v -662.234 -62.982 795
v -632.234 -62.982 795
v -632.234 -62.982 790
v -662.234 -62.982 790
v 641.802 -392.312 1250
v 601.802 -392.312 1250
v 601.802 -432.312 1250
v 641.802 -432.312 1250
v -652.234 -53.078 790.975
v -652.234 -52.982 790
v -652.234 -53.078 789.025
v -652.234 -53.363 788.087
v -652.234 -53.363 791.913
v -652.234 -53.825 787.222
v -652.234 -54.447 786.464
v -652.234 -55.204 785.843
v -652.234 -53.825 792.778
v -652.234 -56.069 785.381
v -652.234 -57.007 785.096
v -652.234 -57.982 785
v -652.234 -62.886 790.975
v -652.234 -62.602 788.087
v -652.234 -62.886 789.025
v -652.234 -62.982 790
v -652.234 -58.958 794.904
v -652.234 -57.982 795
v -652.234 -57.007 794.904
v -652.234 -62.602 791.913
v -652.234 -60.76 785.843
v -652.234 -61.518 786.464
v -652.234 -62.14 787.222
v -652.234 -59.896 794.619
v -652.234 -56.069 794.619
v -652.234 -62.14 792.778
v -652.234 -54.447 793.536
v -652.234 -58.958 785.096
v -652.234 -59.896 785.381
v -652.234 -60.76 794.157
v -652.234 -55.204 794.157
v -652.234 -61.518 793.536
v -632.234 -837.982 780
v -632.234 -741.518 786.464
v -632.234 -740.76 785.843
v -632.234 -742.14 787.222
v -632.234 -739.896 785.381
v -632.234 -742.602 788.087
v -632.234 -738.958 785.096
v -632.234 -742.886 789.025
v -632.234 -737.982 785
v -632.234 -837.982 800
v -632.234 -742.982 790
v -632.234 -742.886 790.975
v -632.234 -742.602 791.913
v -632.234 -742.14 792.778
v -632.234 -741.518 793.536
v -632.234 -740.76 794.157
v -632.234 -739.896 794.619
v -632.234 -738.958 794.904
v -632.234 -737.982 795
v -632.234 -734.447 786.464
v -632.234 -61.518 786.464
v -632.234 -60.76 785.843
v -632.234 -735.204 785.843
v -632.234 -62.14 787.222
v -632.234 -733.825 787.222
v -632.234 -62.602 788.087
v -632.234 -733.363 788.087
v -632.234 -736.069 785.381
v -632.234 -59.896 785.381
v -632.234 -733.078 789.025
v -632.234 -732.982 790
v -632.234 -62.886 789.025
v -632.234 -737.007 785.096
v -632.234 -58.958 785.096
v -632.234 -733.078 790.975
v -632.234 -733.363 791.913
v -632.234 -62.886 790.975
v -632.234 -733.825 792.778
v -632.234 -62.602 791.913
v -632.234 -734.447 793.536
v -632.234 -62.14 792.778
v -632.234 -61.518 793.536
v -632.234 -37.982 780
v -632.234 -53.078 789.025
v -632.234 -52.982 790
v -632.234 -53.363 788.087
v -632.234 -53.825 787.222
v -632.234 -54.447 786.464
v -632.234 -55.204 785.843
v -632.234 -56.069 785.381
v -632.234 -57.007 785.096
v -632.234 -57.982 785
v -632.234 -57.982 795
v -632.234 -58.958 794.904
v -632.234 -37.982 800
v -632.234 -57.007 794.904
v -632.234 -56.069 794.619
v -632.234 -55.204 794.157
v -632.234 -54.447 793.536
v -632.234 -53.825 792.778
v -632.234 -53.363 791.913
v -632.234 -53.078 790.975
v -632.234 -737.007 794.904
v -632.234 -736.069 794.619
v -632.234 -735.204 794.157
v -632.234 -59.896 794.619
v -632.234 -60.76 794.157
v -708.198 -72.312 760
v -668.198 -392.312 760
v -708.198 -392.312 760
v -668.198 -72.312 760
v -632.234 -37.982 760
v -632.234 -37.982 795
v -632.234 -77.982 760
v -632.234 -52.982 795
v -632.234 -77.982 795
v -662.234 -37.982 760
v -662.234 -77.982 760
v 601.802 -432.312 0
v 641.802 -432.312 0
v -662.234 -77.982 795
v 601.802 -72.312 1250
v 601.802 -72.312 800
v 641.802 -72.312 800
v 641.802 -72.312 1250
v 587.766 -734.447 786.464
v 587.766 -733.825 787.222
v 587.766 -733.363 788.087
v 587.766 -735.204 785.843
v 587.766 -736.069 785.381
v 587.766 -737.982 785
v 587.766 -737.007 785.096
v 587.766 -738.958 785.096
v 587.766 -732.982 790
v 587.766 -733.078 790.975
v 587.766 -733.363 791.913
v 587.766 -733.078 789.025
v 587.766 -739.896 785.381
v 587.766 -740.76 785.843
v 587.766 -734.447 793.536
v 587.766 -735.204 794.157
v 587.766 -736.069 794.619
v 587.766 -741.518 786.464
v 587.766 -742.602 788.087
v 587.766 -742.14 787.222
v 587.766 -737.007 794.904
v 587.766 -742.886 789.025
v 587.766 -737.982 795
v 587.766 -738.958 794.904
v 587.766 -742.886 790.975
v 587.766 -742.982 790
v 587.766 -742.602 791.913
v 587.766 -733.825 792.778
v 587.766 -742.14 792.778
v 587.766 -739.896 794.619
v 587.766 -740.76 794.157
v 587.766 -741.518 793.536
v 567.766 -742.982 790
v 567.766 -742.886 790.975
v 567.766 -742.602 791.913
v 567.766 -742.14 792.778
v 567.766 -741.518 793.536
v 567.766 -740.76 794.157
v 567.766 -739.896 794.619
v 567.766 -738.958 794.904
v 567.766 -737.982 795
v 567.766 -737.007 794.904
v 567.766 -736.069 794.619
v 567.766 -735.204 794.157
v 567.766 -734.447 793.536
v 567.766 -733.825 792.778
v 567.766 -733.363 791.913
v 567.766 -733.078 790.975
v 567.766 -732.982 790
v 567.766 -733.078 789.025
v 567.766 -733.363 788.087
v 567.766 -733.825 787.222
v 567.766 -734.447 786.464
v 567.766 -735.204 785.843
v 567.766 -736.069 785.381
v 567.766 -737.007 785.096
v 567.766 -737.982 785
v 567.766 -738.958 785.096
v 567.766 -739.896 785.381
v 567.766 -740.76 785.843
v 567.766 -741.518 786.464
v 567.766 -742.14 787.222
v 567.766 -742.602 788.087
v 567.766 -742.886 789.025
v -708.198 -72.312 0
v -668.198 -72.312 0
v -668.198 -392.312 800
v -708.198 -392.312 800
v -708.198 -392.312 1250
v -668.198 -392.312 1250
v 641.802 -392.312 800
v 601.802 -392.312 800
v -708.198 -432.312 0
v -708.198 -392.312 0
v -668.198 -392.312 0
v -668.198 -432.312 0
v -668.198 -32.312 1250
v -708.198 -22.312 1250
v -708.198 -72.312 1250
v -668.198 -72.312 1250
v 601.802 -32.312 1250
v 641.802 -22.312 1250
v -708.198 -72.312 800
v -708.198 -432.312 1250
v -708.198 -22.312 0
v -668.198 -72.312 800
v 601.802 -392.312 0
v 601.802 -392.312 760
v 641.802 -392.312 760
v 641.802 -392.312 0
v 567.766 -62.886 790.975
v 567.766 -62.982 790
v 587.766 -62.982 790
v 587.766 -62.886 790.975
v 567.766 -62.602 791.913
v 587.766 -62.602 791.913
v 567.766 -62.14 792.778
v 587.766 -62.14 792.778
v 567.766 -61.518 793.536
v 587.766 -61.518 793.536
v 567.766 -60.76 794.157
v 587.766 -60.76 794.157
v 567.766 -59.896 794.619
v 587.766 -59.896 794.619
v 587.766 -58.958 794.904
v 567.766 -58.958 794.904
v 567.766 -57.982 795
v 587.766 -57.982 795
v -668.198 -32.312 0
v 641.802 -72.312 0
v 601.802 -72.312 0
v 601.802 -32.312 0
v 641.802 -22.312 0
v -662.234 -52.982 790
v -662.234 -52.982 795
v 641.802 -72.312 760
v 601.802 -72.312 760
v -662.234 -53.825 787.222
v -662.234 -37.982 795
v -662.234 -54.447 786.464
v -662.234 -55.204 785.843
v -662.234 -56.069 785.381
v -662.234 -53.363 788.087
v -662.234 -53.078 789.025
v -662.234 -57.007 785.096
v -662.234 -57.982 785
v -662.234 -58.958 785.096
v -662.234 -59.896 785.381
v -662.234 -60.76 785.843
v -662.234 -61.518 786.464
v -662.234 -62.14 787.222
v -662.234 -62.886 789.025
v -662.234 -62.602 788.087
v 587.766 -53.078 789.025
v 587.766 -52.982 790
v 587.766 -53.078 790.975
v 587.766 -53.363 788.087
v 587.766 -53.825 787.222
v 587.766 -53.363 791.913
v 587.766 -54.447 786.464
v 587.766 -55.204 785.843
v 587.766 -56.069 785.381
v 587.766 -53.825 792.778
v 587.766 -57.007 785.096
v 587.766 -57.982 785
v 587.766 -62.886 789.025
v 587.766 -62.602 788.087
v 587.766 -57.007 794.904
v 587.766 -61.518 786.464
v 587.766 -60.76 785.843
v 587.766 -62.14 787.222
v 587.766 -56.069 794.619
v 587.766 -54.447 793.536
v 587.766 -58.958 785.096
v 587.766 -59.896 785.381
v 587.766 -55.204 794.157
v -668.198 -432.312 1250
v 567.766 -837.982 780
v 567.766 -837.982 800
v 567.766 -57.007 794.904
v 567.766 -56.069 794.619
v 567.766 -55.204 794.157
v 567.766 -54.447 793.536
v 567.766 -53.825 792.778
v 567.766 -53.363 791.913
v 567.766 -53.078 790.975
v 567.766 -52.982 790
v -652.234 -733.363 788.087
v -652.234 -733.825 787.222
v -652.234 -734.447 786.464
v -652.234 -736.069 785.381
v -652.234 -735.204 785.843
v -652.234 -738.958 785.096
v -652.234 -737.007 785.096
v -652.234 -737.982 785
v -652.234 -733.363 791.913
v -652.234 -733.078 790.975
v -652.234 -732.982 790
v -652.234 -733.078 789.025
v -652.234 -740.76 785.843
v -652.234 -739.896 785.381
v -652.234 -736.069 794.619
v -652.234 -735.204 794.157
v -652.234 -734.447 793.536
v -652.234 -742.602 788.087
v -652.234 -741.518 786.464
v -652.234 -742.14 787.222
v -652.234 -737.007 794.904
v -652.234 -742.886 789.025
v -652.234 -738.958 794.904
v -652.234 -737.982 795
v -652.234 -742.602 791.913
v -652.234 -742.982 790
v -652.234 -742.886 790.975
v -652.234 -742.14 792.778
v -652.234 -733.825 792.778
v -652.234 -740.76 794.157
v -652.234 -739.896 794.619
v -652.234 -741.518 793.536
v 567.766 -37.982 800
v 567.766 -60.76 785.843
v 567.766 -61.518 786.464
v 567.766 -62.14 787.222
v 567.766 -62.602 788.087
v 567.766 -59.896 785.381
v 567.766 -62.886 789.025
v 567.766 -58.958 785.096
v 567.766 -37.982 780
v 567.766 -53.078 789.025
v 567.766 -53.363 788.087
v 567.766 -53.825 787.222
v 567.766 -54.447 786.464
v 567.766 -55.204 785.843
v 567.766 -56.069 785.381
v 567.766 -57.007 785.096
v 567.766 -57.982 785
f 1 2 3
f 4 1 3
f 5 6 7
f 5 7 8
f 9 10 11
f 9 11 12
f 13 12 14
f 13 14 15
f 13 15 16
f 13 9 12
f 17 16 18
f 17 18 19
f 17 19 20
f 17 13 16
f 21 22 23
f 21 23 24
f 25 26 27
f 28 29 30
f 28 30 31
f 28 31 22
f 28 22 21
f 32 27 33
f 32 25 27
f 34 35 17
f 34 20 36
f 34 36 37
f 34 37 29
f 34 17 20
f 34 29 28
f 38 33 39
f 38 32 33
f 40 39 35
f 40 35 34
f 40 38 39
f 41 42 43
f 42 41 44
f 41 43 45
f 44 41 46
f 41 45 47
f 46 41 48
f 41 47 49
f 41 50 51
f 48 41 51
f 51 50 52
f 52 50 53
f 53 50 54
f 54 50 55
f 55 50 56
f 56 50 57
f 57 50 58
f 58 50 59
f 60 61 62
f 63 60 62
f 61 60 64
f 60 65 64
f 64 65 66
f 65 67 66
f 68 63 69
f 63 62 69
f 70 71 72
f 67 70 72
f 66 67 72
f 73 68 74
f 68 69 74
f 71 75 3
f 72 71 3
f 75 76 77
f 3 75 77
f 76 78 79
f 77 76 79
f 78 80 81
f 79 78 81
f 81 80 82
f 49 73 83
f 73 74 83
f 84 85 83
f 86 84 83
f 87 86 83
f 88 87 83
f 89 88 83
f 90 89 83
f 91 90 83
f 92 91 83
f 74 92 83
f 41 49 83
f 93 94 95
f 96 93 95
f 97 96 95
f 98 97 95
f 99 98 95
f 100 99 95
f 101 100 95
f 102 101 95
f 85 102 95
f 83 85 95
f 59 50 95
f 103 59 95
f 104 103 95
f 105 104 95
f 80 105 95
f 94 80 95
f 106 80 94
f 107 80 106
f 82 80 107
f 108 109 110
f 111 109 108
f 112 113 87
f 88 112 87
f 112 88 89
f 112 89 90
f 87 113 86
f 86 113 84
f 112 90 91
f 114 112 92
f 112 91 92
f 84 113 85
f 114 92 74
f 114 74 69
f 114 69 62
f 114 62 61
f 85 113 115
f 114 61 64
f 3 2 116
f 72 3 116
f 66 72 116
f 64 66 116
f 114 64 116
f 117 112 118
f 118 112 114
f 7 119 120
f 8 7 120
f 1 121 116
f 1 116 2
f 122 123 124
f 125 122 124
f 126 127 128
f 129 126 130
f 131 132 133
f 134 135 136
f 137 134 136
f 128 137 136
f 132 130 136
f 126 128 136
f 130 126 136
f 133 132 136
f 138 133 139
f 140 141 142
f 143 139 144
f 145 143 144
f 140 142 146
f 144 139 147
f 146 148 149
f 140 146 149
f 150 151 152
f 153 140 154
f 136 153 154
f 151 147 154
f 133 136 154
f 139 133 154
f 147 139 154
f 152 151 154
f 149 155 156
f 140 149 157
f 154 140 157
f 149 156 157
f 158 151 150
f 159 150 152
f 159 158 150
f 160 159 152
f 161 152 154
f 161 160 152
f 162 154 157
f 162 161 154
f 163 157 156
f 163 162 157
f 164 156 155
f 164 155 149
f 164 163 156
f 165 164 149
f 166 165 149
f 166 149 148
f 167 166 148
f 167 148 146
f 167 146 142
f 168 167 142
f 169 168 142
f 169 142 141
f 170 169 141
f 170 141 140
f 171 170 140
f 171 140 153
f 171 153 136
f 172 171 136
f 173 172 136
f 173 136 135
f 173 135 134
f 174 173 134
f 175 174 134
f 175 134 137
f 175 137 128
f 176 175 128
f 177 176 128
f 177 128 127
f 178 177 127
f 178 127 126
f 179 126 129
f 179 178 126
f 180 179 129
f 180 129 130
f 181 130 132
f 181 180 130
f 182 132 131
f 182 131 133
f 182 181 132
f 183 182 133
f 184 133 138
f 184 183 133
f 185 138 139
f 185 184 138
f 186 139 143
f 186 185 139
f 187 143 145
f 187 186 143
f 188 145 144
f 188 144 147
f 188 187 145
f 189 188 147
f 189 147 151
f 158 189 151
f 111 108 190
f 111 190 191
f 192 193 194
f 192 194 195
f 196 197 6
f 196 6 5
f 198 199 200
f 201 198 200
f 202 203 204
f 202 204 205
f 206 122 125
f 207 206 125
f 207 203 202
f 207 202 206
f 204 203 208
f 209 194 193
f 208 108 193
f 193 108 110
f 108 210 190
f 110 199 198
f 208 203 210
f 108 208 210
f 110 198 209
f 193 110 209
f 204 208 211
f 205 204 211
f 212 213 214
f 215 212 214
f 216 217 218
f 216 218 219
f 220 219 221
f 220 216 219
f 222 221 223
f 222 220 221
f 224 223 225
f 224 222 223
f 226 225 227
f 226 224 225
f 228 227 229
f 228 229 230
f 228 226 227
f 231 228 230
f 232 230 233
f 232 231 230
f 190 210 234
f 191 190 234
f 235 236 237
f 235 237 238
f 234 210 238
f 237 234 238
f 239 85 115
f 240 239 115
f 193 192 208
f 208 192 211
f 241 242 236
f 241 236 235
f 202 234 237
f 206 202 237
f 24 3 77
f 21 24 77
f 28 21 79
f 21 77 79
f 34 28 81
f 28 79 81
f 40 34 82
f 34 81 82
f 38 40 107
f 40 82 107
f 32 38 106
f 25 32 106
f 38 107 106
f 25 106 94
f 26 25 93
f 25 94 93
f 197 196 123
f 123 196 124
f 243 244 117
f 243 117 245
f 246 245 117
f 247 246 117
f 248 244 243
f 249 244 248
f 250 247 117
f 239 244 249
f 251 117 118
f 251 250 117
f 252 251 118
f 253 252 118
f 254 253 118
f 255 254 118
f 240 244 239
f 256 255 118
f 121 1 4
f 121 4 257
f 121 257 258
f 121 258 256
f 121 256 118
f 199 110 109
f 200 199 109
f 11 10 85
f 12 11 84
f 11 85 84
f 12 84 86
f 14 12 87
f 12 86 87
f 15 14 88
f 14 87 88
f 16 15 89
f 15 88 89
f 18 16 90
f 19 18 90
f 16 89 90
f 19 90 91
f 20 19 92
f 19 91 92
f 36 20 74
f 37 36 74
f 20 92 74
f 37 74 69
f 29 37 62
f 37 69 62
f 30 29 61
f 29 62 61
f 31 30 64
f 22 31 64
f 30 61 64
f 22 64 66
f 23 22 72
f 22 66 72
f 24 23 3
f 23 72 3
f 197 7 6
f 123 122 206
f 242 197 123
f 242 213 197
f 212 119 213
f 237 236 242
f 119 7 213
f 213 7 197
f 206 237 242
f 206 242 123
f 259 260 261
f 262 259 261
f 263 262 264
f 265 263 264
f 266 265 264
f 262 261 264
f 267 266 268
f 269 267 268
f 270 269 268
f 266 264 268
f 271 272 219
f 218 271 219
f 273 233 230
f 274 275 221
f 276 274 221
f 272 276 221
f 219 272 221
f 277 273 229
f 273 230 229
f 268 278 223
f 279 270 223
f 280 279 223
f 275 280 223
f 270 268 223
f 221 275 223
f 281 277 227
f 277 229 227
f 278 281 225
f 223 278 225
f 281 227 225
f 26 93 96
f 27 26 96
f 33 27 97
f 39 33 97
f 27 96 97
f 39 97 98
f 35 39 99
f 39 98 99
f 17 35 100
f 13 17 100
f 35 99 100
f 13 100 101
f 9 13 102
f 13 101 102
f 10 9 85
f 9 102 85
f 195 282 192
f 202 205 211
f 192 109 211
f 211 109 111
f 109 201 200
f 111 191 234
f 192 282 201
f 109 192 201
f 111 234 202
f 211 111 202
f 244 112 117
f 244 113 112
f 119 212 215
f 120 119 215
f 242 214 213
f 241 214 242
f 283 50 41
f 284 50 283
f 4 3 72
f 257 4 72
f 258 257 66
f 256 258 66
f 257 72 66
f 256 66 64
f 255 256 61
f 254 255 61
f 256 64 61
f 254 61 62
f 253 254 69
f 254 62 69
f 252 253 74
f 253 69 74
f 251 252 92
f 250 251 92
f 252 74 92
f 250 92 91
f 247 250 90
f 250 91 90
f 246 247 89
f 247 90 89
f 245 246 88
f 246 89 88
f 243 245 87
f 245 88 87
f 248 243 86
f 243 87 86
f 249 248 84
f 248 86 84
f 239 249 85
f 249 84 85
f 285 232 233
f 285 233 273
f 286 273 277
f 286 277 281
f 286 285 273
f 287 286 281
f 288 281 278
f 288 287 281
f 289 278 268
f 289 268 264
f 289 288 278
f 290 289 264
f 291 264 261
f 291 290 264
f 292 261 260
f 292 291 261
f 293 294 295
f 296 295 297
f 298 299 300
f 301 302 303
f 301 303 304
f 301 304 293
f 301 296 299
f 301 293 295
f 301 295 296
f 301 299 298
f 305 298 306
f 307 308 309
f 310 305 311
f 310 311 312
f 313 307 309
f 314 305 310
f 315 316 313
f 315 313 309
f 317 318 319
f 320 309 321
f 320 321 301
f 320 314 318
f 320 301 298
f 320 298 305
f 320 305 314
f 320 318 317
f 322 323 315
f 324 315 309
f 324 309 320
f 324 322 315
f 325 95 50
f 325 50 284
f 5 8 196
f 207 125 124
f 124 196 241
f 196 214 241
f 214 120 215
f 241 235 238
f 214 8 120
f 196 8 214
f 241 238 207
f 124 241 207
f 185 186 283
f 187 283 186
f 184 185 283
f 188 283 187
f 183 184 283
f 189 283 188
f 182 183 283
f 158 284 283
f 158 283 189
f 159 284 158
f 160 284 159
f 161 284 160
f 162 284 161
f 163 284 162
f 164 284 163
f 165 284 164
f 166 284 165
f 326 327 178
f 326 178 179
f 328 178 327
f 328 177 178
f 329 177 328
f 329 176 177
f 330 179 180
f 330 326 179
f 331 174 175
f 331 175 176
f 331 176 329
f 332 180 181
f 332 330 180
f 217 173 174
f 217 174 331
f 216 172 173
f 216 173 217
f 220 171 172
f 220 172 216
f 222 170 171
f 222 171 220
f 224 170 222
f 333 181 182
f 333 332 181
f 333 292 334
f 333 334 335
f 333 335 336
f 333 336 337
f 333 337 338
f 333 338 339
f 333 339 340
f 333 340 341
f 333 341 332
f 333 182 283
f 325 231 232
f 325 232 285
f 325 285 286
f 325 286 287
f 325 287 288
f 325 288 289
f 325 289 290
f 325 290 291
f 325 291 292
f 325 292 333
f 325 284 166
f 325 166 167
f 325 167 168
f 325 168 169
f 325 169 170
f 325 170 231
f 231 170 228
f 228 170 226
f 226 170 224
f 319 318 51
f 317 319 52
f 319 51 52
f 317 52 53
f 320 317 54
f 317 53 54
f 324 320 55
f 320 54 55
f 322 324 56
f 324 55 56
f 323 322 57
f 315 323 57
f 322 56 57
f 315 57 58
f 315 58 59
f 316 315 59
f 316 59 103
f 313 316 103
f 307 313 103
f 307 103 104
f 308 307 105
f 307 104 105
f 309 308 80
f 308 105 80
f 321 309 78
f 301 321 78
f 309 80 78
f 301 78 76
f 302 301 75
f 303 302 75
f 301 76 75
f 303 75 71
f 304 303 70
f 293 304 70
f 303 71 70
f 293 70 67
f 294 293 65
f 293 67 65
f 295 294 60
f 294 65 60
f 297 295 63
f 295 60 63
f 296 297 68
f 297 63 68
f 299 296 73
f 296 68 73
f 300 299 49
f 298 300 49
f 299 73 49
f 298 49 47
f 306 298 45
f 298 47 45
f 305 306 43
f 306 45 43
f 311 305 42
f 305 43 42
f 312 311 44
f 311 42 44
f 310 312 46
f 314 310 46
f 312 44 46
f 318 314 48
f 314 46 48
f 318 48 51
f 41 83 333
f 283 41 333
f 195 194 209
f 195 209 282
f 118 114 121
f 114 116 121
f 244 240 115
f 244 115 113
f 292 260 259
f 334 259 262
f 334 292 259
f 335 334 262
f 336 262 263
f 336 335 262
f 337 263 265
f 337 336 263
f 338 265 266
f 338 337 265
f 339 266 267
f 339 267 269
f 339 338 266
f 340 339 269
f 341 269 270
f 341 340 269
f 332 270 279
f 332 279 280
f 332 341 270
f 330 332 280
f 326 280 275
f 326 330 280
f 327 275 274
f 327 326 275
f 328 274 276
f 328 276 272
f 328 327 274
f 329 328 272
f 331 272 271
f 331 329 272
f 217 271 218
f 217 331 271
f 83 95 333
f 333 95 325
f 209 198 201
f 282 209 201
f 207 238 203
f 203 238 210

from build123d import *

# Parameters (mm, degrees)
F0_W      = 40
F0_H      = 40
F1_DEPTH  = 1250
F2_W      = 320
F2_H      = 40
F3_DEPTH  = 40
F4_W      = 320
F4_H      = 40
F5_DEPTH  = 40
F6_W      = 1200
F6_H      = 800
F7_DEPTH  = 20
F8_R      = 5
F9_DEPTH  = 20
F10_DEPTH = 1240
F11_DEPTH = 30
F12_DEPTH = 20


with BuildPart() as f1:
    # F0 (on Top) → F1 (new body)
    with BuildSketch(Plane.XY):
        with Locations((-688.1983089447, -412.3124587536)):
            Rectangle(F0_W, F0_H)
    extrude(amount=F1_DEPTH)



with BuildPart() as f1b:
    # F0 (on Top) → F1, piece 2 (new body)
    with BuildSketch(Plane.XY):
        Polygon((-668.1983089447, -72.3124587536), (-668.1983089447, -32.3124587536), (601.8016910553, -32.3124587536), (601.8016910553, -72.3124587536), (641.8016910553, -72.3124587536), (641.8016910553, -22.3124587536), (601.8016910553, -22.3124587536), (-708.1983089447, -22.3124587536), (-708.1983089447, -32.3124587536), (-708.1983089447, -72.3124587536), align=None)
    extrude(amount=F1_DEPTH)


with BuildPart() as f1c:
    # F0 (on Top) → F1, piece 3 (new body)
    with BuildSketch(Plane.XY):
        with Locations((621.8016910553, -412.3124587536)):
            Rectangle(F0_W, F0_H)
    extrude(amount=F1_DEPTH)


with BuildPart() as f1_1:
    add(f1.part)

    add(f1b.part)  # F3 merges F1b
    # F2 (on face) → F3 (join)
    with BuildSketch(Plane.YZ.offset(-668.1983089447)):
        with Locations((-232.3124587536, 780)):
            Rectangle(F2_W, F2_H)
    extrude(amount=-F3_DEPTH)


    add(f1c.part)  # F5 merges F1c
    # F4 (on face) → F5 (join)
    with BuildSketch(Plane.YZ.offset(641.8016910553)):
        with Locations((-232.3124587536, 780)):
            Rectangle(F4_W, F4_H)
    extrude(amount=-F5_DEPTH)


with BuildPart() as f7:
    # F6 (on face) → F7 (new body)
    with BuildSketch(Plane.XY.offset(800)):
        with Locations((-32.2343409061, -437.982240646)):
            Rectangle(F6_W, F6_H)
    extrude(amount=-F7_DEPTH)

    # F8 (on face) → F9 (join)
    with BuildSketch(Plane(origin=(-632.2343409061, 0, 0), x_dir=(0, -1, 0), z_dir=(-1, 0, 0))):
        with BuildLine():
            ThreePointArc((57.982240646, 795), (54.4467067401, 793.5355339059), (52.982240646, 790))
            ThreePointArc((52.982240646, 790), (57.982240646, 785), (62.982240646, 790))
            ThreePointArc((62.982240646, 790), (61.5177745519, 793.5355339059), (57.982240646, 795))
        make_face()
        with Locations((737.982240646, 790)):
            Circle(F8_R)
    extrude(amount=F9_DEPTH)

    # F10 (add): faces of the model
    f10_faces = [f7.faces().sort_by_distance(p)[0] for p in [
        (-652.2343409061, -737.982240646, 790),
        (-652.2343409061, -57.982240646, 790),
    ]]
    extrude(f10_faces, amount=-F10_DEPTH)


with BuildPart() as f11:
    # F8 (on face) → F11 (new body)
    with BuildSketch(Plane(origin=(-632.2343409061, 0, 0), x_dir=(0, -1, 0), z_dir=(-1, 0, 0))):
        with BuildLine():
            ThreePointArc((62.982240646, 790), (57.982240646, 785), (52.982240646, 790))
            Line((52.982240646, 790), (52.982240646, 795))
            Line((52.982240646, 795), (37.982240646, 795))
            Line((37.982240646, 795), (37.982240646, 780))
            Line((37.982240646, 780), (77.982240646, 780))
            Line((77.982240646, 780), (77.982240646, 795))
            Line((77.982240646, 795), (62.982240646, 795))
            Line((62.982240646, 795), (62.982240646, 790))
        make_face()
    extrude(amount=F11_DEPTH)

    # F12 (add): a face of the model
    f12_faces = [f11.faces().sort_by_distance(p)[0] for p in [
        (-647.2343409061, -57.982240646, 780),
    ]]
    extrude(f12_faces, amount=F12_DEPTH)


solid = Compound([f1_1.part, f7.part, f11.part])
